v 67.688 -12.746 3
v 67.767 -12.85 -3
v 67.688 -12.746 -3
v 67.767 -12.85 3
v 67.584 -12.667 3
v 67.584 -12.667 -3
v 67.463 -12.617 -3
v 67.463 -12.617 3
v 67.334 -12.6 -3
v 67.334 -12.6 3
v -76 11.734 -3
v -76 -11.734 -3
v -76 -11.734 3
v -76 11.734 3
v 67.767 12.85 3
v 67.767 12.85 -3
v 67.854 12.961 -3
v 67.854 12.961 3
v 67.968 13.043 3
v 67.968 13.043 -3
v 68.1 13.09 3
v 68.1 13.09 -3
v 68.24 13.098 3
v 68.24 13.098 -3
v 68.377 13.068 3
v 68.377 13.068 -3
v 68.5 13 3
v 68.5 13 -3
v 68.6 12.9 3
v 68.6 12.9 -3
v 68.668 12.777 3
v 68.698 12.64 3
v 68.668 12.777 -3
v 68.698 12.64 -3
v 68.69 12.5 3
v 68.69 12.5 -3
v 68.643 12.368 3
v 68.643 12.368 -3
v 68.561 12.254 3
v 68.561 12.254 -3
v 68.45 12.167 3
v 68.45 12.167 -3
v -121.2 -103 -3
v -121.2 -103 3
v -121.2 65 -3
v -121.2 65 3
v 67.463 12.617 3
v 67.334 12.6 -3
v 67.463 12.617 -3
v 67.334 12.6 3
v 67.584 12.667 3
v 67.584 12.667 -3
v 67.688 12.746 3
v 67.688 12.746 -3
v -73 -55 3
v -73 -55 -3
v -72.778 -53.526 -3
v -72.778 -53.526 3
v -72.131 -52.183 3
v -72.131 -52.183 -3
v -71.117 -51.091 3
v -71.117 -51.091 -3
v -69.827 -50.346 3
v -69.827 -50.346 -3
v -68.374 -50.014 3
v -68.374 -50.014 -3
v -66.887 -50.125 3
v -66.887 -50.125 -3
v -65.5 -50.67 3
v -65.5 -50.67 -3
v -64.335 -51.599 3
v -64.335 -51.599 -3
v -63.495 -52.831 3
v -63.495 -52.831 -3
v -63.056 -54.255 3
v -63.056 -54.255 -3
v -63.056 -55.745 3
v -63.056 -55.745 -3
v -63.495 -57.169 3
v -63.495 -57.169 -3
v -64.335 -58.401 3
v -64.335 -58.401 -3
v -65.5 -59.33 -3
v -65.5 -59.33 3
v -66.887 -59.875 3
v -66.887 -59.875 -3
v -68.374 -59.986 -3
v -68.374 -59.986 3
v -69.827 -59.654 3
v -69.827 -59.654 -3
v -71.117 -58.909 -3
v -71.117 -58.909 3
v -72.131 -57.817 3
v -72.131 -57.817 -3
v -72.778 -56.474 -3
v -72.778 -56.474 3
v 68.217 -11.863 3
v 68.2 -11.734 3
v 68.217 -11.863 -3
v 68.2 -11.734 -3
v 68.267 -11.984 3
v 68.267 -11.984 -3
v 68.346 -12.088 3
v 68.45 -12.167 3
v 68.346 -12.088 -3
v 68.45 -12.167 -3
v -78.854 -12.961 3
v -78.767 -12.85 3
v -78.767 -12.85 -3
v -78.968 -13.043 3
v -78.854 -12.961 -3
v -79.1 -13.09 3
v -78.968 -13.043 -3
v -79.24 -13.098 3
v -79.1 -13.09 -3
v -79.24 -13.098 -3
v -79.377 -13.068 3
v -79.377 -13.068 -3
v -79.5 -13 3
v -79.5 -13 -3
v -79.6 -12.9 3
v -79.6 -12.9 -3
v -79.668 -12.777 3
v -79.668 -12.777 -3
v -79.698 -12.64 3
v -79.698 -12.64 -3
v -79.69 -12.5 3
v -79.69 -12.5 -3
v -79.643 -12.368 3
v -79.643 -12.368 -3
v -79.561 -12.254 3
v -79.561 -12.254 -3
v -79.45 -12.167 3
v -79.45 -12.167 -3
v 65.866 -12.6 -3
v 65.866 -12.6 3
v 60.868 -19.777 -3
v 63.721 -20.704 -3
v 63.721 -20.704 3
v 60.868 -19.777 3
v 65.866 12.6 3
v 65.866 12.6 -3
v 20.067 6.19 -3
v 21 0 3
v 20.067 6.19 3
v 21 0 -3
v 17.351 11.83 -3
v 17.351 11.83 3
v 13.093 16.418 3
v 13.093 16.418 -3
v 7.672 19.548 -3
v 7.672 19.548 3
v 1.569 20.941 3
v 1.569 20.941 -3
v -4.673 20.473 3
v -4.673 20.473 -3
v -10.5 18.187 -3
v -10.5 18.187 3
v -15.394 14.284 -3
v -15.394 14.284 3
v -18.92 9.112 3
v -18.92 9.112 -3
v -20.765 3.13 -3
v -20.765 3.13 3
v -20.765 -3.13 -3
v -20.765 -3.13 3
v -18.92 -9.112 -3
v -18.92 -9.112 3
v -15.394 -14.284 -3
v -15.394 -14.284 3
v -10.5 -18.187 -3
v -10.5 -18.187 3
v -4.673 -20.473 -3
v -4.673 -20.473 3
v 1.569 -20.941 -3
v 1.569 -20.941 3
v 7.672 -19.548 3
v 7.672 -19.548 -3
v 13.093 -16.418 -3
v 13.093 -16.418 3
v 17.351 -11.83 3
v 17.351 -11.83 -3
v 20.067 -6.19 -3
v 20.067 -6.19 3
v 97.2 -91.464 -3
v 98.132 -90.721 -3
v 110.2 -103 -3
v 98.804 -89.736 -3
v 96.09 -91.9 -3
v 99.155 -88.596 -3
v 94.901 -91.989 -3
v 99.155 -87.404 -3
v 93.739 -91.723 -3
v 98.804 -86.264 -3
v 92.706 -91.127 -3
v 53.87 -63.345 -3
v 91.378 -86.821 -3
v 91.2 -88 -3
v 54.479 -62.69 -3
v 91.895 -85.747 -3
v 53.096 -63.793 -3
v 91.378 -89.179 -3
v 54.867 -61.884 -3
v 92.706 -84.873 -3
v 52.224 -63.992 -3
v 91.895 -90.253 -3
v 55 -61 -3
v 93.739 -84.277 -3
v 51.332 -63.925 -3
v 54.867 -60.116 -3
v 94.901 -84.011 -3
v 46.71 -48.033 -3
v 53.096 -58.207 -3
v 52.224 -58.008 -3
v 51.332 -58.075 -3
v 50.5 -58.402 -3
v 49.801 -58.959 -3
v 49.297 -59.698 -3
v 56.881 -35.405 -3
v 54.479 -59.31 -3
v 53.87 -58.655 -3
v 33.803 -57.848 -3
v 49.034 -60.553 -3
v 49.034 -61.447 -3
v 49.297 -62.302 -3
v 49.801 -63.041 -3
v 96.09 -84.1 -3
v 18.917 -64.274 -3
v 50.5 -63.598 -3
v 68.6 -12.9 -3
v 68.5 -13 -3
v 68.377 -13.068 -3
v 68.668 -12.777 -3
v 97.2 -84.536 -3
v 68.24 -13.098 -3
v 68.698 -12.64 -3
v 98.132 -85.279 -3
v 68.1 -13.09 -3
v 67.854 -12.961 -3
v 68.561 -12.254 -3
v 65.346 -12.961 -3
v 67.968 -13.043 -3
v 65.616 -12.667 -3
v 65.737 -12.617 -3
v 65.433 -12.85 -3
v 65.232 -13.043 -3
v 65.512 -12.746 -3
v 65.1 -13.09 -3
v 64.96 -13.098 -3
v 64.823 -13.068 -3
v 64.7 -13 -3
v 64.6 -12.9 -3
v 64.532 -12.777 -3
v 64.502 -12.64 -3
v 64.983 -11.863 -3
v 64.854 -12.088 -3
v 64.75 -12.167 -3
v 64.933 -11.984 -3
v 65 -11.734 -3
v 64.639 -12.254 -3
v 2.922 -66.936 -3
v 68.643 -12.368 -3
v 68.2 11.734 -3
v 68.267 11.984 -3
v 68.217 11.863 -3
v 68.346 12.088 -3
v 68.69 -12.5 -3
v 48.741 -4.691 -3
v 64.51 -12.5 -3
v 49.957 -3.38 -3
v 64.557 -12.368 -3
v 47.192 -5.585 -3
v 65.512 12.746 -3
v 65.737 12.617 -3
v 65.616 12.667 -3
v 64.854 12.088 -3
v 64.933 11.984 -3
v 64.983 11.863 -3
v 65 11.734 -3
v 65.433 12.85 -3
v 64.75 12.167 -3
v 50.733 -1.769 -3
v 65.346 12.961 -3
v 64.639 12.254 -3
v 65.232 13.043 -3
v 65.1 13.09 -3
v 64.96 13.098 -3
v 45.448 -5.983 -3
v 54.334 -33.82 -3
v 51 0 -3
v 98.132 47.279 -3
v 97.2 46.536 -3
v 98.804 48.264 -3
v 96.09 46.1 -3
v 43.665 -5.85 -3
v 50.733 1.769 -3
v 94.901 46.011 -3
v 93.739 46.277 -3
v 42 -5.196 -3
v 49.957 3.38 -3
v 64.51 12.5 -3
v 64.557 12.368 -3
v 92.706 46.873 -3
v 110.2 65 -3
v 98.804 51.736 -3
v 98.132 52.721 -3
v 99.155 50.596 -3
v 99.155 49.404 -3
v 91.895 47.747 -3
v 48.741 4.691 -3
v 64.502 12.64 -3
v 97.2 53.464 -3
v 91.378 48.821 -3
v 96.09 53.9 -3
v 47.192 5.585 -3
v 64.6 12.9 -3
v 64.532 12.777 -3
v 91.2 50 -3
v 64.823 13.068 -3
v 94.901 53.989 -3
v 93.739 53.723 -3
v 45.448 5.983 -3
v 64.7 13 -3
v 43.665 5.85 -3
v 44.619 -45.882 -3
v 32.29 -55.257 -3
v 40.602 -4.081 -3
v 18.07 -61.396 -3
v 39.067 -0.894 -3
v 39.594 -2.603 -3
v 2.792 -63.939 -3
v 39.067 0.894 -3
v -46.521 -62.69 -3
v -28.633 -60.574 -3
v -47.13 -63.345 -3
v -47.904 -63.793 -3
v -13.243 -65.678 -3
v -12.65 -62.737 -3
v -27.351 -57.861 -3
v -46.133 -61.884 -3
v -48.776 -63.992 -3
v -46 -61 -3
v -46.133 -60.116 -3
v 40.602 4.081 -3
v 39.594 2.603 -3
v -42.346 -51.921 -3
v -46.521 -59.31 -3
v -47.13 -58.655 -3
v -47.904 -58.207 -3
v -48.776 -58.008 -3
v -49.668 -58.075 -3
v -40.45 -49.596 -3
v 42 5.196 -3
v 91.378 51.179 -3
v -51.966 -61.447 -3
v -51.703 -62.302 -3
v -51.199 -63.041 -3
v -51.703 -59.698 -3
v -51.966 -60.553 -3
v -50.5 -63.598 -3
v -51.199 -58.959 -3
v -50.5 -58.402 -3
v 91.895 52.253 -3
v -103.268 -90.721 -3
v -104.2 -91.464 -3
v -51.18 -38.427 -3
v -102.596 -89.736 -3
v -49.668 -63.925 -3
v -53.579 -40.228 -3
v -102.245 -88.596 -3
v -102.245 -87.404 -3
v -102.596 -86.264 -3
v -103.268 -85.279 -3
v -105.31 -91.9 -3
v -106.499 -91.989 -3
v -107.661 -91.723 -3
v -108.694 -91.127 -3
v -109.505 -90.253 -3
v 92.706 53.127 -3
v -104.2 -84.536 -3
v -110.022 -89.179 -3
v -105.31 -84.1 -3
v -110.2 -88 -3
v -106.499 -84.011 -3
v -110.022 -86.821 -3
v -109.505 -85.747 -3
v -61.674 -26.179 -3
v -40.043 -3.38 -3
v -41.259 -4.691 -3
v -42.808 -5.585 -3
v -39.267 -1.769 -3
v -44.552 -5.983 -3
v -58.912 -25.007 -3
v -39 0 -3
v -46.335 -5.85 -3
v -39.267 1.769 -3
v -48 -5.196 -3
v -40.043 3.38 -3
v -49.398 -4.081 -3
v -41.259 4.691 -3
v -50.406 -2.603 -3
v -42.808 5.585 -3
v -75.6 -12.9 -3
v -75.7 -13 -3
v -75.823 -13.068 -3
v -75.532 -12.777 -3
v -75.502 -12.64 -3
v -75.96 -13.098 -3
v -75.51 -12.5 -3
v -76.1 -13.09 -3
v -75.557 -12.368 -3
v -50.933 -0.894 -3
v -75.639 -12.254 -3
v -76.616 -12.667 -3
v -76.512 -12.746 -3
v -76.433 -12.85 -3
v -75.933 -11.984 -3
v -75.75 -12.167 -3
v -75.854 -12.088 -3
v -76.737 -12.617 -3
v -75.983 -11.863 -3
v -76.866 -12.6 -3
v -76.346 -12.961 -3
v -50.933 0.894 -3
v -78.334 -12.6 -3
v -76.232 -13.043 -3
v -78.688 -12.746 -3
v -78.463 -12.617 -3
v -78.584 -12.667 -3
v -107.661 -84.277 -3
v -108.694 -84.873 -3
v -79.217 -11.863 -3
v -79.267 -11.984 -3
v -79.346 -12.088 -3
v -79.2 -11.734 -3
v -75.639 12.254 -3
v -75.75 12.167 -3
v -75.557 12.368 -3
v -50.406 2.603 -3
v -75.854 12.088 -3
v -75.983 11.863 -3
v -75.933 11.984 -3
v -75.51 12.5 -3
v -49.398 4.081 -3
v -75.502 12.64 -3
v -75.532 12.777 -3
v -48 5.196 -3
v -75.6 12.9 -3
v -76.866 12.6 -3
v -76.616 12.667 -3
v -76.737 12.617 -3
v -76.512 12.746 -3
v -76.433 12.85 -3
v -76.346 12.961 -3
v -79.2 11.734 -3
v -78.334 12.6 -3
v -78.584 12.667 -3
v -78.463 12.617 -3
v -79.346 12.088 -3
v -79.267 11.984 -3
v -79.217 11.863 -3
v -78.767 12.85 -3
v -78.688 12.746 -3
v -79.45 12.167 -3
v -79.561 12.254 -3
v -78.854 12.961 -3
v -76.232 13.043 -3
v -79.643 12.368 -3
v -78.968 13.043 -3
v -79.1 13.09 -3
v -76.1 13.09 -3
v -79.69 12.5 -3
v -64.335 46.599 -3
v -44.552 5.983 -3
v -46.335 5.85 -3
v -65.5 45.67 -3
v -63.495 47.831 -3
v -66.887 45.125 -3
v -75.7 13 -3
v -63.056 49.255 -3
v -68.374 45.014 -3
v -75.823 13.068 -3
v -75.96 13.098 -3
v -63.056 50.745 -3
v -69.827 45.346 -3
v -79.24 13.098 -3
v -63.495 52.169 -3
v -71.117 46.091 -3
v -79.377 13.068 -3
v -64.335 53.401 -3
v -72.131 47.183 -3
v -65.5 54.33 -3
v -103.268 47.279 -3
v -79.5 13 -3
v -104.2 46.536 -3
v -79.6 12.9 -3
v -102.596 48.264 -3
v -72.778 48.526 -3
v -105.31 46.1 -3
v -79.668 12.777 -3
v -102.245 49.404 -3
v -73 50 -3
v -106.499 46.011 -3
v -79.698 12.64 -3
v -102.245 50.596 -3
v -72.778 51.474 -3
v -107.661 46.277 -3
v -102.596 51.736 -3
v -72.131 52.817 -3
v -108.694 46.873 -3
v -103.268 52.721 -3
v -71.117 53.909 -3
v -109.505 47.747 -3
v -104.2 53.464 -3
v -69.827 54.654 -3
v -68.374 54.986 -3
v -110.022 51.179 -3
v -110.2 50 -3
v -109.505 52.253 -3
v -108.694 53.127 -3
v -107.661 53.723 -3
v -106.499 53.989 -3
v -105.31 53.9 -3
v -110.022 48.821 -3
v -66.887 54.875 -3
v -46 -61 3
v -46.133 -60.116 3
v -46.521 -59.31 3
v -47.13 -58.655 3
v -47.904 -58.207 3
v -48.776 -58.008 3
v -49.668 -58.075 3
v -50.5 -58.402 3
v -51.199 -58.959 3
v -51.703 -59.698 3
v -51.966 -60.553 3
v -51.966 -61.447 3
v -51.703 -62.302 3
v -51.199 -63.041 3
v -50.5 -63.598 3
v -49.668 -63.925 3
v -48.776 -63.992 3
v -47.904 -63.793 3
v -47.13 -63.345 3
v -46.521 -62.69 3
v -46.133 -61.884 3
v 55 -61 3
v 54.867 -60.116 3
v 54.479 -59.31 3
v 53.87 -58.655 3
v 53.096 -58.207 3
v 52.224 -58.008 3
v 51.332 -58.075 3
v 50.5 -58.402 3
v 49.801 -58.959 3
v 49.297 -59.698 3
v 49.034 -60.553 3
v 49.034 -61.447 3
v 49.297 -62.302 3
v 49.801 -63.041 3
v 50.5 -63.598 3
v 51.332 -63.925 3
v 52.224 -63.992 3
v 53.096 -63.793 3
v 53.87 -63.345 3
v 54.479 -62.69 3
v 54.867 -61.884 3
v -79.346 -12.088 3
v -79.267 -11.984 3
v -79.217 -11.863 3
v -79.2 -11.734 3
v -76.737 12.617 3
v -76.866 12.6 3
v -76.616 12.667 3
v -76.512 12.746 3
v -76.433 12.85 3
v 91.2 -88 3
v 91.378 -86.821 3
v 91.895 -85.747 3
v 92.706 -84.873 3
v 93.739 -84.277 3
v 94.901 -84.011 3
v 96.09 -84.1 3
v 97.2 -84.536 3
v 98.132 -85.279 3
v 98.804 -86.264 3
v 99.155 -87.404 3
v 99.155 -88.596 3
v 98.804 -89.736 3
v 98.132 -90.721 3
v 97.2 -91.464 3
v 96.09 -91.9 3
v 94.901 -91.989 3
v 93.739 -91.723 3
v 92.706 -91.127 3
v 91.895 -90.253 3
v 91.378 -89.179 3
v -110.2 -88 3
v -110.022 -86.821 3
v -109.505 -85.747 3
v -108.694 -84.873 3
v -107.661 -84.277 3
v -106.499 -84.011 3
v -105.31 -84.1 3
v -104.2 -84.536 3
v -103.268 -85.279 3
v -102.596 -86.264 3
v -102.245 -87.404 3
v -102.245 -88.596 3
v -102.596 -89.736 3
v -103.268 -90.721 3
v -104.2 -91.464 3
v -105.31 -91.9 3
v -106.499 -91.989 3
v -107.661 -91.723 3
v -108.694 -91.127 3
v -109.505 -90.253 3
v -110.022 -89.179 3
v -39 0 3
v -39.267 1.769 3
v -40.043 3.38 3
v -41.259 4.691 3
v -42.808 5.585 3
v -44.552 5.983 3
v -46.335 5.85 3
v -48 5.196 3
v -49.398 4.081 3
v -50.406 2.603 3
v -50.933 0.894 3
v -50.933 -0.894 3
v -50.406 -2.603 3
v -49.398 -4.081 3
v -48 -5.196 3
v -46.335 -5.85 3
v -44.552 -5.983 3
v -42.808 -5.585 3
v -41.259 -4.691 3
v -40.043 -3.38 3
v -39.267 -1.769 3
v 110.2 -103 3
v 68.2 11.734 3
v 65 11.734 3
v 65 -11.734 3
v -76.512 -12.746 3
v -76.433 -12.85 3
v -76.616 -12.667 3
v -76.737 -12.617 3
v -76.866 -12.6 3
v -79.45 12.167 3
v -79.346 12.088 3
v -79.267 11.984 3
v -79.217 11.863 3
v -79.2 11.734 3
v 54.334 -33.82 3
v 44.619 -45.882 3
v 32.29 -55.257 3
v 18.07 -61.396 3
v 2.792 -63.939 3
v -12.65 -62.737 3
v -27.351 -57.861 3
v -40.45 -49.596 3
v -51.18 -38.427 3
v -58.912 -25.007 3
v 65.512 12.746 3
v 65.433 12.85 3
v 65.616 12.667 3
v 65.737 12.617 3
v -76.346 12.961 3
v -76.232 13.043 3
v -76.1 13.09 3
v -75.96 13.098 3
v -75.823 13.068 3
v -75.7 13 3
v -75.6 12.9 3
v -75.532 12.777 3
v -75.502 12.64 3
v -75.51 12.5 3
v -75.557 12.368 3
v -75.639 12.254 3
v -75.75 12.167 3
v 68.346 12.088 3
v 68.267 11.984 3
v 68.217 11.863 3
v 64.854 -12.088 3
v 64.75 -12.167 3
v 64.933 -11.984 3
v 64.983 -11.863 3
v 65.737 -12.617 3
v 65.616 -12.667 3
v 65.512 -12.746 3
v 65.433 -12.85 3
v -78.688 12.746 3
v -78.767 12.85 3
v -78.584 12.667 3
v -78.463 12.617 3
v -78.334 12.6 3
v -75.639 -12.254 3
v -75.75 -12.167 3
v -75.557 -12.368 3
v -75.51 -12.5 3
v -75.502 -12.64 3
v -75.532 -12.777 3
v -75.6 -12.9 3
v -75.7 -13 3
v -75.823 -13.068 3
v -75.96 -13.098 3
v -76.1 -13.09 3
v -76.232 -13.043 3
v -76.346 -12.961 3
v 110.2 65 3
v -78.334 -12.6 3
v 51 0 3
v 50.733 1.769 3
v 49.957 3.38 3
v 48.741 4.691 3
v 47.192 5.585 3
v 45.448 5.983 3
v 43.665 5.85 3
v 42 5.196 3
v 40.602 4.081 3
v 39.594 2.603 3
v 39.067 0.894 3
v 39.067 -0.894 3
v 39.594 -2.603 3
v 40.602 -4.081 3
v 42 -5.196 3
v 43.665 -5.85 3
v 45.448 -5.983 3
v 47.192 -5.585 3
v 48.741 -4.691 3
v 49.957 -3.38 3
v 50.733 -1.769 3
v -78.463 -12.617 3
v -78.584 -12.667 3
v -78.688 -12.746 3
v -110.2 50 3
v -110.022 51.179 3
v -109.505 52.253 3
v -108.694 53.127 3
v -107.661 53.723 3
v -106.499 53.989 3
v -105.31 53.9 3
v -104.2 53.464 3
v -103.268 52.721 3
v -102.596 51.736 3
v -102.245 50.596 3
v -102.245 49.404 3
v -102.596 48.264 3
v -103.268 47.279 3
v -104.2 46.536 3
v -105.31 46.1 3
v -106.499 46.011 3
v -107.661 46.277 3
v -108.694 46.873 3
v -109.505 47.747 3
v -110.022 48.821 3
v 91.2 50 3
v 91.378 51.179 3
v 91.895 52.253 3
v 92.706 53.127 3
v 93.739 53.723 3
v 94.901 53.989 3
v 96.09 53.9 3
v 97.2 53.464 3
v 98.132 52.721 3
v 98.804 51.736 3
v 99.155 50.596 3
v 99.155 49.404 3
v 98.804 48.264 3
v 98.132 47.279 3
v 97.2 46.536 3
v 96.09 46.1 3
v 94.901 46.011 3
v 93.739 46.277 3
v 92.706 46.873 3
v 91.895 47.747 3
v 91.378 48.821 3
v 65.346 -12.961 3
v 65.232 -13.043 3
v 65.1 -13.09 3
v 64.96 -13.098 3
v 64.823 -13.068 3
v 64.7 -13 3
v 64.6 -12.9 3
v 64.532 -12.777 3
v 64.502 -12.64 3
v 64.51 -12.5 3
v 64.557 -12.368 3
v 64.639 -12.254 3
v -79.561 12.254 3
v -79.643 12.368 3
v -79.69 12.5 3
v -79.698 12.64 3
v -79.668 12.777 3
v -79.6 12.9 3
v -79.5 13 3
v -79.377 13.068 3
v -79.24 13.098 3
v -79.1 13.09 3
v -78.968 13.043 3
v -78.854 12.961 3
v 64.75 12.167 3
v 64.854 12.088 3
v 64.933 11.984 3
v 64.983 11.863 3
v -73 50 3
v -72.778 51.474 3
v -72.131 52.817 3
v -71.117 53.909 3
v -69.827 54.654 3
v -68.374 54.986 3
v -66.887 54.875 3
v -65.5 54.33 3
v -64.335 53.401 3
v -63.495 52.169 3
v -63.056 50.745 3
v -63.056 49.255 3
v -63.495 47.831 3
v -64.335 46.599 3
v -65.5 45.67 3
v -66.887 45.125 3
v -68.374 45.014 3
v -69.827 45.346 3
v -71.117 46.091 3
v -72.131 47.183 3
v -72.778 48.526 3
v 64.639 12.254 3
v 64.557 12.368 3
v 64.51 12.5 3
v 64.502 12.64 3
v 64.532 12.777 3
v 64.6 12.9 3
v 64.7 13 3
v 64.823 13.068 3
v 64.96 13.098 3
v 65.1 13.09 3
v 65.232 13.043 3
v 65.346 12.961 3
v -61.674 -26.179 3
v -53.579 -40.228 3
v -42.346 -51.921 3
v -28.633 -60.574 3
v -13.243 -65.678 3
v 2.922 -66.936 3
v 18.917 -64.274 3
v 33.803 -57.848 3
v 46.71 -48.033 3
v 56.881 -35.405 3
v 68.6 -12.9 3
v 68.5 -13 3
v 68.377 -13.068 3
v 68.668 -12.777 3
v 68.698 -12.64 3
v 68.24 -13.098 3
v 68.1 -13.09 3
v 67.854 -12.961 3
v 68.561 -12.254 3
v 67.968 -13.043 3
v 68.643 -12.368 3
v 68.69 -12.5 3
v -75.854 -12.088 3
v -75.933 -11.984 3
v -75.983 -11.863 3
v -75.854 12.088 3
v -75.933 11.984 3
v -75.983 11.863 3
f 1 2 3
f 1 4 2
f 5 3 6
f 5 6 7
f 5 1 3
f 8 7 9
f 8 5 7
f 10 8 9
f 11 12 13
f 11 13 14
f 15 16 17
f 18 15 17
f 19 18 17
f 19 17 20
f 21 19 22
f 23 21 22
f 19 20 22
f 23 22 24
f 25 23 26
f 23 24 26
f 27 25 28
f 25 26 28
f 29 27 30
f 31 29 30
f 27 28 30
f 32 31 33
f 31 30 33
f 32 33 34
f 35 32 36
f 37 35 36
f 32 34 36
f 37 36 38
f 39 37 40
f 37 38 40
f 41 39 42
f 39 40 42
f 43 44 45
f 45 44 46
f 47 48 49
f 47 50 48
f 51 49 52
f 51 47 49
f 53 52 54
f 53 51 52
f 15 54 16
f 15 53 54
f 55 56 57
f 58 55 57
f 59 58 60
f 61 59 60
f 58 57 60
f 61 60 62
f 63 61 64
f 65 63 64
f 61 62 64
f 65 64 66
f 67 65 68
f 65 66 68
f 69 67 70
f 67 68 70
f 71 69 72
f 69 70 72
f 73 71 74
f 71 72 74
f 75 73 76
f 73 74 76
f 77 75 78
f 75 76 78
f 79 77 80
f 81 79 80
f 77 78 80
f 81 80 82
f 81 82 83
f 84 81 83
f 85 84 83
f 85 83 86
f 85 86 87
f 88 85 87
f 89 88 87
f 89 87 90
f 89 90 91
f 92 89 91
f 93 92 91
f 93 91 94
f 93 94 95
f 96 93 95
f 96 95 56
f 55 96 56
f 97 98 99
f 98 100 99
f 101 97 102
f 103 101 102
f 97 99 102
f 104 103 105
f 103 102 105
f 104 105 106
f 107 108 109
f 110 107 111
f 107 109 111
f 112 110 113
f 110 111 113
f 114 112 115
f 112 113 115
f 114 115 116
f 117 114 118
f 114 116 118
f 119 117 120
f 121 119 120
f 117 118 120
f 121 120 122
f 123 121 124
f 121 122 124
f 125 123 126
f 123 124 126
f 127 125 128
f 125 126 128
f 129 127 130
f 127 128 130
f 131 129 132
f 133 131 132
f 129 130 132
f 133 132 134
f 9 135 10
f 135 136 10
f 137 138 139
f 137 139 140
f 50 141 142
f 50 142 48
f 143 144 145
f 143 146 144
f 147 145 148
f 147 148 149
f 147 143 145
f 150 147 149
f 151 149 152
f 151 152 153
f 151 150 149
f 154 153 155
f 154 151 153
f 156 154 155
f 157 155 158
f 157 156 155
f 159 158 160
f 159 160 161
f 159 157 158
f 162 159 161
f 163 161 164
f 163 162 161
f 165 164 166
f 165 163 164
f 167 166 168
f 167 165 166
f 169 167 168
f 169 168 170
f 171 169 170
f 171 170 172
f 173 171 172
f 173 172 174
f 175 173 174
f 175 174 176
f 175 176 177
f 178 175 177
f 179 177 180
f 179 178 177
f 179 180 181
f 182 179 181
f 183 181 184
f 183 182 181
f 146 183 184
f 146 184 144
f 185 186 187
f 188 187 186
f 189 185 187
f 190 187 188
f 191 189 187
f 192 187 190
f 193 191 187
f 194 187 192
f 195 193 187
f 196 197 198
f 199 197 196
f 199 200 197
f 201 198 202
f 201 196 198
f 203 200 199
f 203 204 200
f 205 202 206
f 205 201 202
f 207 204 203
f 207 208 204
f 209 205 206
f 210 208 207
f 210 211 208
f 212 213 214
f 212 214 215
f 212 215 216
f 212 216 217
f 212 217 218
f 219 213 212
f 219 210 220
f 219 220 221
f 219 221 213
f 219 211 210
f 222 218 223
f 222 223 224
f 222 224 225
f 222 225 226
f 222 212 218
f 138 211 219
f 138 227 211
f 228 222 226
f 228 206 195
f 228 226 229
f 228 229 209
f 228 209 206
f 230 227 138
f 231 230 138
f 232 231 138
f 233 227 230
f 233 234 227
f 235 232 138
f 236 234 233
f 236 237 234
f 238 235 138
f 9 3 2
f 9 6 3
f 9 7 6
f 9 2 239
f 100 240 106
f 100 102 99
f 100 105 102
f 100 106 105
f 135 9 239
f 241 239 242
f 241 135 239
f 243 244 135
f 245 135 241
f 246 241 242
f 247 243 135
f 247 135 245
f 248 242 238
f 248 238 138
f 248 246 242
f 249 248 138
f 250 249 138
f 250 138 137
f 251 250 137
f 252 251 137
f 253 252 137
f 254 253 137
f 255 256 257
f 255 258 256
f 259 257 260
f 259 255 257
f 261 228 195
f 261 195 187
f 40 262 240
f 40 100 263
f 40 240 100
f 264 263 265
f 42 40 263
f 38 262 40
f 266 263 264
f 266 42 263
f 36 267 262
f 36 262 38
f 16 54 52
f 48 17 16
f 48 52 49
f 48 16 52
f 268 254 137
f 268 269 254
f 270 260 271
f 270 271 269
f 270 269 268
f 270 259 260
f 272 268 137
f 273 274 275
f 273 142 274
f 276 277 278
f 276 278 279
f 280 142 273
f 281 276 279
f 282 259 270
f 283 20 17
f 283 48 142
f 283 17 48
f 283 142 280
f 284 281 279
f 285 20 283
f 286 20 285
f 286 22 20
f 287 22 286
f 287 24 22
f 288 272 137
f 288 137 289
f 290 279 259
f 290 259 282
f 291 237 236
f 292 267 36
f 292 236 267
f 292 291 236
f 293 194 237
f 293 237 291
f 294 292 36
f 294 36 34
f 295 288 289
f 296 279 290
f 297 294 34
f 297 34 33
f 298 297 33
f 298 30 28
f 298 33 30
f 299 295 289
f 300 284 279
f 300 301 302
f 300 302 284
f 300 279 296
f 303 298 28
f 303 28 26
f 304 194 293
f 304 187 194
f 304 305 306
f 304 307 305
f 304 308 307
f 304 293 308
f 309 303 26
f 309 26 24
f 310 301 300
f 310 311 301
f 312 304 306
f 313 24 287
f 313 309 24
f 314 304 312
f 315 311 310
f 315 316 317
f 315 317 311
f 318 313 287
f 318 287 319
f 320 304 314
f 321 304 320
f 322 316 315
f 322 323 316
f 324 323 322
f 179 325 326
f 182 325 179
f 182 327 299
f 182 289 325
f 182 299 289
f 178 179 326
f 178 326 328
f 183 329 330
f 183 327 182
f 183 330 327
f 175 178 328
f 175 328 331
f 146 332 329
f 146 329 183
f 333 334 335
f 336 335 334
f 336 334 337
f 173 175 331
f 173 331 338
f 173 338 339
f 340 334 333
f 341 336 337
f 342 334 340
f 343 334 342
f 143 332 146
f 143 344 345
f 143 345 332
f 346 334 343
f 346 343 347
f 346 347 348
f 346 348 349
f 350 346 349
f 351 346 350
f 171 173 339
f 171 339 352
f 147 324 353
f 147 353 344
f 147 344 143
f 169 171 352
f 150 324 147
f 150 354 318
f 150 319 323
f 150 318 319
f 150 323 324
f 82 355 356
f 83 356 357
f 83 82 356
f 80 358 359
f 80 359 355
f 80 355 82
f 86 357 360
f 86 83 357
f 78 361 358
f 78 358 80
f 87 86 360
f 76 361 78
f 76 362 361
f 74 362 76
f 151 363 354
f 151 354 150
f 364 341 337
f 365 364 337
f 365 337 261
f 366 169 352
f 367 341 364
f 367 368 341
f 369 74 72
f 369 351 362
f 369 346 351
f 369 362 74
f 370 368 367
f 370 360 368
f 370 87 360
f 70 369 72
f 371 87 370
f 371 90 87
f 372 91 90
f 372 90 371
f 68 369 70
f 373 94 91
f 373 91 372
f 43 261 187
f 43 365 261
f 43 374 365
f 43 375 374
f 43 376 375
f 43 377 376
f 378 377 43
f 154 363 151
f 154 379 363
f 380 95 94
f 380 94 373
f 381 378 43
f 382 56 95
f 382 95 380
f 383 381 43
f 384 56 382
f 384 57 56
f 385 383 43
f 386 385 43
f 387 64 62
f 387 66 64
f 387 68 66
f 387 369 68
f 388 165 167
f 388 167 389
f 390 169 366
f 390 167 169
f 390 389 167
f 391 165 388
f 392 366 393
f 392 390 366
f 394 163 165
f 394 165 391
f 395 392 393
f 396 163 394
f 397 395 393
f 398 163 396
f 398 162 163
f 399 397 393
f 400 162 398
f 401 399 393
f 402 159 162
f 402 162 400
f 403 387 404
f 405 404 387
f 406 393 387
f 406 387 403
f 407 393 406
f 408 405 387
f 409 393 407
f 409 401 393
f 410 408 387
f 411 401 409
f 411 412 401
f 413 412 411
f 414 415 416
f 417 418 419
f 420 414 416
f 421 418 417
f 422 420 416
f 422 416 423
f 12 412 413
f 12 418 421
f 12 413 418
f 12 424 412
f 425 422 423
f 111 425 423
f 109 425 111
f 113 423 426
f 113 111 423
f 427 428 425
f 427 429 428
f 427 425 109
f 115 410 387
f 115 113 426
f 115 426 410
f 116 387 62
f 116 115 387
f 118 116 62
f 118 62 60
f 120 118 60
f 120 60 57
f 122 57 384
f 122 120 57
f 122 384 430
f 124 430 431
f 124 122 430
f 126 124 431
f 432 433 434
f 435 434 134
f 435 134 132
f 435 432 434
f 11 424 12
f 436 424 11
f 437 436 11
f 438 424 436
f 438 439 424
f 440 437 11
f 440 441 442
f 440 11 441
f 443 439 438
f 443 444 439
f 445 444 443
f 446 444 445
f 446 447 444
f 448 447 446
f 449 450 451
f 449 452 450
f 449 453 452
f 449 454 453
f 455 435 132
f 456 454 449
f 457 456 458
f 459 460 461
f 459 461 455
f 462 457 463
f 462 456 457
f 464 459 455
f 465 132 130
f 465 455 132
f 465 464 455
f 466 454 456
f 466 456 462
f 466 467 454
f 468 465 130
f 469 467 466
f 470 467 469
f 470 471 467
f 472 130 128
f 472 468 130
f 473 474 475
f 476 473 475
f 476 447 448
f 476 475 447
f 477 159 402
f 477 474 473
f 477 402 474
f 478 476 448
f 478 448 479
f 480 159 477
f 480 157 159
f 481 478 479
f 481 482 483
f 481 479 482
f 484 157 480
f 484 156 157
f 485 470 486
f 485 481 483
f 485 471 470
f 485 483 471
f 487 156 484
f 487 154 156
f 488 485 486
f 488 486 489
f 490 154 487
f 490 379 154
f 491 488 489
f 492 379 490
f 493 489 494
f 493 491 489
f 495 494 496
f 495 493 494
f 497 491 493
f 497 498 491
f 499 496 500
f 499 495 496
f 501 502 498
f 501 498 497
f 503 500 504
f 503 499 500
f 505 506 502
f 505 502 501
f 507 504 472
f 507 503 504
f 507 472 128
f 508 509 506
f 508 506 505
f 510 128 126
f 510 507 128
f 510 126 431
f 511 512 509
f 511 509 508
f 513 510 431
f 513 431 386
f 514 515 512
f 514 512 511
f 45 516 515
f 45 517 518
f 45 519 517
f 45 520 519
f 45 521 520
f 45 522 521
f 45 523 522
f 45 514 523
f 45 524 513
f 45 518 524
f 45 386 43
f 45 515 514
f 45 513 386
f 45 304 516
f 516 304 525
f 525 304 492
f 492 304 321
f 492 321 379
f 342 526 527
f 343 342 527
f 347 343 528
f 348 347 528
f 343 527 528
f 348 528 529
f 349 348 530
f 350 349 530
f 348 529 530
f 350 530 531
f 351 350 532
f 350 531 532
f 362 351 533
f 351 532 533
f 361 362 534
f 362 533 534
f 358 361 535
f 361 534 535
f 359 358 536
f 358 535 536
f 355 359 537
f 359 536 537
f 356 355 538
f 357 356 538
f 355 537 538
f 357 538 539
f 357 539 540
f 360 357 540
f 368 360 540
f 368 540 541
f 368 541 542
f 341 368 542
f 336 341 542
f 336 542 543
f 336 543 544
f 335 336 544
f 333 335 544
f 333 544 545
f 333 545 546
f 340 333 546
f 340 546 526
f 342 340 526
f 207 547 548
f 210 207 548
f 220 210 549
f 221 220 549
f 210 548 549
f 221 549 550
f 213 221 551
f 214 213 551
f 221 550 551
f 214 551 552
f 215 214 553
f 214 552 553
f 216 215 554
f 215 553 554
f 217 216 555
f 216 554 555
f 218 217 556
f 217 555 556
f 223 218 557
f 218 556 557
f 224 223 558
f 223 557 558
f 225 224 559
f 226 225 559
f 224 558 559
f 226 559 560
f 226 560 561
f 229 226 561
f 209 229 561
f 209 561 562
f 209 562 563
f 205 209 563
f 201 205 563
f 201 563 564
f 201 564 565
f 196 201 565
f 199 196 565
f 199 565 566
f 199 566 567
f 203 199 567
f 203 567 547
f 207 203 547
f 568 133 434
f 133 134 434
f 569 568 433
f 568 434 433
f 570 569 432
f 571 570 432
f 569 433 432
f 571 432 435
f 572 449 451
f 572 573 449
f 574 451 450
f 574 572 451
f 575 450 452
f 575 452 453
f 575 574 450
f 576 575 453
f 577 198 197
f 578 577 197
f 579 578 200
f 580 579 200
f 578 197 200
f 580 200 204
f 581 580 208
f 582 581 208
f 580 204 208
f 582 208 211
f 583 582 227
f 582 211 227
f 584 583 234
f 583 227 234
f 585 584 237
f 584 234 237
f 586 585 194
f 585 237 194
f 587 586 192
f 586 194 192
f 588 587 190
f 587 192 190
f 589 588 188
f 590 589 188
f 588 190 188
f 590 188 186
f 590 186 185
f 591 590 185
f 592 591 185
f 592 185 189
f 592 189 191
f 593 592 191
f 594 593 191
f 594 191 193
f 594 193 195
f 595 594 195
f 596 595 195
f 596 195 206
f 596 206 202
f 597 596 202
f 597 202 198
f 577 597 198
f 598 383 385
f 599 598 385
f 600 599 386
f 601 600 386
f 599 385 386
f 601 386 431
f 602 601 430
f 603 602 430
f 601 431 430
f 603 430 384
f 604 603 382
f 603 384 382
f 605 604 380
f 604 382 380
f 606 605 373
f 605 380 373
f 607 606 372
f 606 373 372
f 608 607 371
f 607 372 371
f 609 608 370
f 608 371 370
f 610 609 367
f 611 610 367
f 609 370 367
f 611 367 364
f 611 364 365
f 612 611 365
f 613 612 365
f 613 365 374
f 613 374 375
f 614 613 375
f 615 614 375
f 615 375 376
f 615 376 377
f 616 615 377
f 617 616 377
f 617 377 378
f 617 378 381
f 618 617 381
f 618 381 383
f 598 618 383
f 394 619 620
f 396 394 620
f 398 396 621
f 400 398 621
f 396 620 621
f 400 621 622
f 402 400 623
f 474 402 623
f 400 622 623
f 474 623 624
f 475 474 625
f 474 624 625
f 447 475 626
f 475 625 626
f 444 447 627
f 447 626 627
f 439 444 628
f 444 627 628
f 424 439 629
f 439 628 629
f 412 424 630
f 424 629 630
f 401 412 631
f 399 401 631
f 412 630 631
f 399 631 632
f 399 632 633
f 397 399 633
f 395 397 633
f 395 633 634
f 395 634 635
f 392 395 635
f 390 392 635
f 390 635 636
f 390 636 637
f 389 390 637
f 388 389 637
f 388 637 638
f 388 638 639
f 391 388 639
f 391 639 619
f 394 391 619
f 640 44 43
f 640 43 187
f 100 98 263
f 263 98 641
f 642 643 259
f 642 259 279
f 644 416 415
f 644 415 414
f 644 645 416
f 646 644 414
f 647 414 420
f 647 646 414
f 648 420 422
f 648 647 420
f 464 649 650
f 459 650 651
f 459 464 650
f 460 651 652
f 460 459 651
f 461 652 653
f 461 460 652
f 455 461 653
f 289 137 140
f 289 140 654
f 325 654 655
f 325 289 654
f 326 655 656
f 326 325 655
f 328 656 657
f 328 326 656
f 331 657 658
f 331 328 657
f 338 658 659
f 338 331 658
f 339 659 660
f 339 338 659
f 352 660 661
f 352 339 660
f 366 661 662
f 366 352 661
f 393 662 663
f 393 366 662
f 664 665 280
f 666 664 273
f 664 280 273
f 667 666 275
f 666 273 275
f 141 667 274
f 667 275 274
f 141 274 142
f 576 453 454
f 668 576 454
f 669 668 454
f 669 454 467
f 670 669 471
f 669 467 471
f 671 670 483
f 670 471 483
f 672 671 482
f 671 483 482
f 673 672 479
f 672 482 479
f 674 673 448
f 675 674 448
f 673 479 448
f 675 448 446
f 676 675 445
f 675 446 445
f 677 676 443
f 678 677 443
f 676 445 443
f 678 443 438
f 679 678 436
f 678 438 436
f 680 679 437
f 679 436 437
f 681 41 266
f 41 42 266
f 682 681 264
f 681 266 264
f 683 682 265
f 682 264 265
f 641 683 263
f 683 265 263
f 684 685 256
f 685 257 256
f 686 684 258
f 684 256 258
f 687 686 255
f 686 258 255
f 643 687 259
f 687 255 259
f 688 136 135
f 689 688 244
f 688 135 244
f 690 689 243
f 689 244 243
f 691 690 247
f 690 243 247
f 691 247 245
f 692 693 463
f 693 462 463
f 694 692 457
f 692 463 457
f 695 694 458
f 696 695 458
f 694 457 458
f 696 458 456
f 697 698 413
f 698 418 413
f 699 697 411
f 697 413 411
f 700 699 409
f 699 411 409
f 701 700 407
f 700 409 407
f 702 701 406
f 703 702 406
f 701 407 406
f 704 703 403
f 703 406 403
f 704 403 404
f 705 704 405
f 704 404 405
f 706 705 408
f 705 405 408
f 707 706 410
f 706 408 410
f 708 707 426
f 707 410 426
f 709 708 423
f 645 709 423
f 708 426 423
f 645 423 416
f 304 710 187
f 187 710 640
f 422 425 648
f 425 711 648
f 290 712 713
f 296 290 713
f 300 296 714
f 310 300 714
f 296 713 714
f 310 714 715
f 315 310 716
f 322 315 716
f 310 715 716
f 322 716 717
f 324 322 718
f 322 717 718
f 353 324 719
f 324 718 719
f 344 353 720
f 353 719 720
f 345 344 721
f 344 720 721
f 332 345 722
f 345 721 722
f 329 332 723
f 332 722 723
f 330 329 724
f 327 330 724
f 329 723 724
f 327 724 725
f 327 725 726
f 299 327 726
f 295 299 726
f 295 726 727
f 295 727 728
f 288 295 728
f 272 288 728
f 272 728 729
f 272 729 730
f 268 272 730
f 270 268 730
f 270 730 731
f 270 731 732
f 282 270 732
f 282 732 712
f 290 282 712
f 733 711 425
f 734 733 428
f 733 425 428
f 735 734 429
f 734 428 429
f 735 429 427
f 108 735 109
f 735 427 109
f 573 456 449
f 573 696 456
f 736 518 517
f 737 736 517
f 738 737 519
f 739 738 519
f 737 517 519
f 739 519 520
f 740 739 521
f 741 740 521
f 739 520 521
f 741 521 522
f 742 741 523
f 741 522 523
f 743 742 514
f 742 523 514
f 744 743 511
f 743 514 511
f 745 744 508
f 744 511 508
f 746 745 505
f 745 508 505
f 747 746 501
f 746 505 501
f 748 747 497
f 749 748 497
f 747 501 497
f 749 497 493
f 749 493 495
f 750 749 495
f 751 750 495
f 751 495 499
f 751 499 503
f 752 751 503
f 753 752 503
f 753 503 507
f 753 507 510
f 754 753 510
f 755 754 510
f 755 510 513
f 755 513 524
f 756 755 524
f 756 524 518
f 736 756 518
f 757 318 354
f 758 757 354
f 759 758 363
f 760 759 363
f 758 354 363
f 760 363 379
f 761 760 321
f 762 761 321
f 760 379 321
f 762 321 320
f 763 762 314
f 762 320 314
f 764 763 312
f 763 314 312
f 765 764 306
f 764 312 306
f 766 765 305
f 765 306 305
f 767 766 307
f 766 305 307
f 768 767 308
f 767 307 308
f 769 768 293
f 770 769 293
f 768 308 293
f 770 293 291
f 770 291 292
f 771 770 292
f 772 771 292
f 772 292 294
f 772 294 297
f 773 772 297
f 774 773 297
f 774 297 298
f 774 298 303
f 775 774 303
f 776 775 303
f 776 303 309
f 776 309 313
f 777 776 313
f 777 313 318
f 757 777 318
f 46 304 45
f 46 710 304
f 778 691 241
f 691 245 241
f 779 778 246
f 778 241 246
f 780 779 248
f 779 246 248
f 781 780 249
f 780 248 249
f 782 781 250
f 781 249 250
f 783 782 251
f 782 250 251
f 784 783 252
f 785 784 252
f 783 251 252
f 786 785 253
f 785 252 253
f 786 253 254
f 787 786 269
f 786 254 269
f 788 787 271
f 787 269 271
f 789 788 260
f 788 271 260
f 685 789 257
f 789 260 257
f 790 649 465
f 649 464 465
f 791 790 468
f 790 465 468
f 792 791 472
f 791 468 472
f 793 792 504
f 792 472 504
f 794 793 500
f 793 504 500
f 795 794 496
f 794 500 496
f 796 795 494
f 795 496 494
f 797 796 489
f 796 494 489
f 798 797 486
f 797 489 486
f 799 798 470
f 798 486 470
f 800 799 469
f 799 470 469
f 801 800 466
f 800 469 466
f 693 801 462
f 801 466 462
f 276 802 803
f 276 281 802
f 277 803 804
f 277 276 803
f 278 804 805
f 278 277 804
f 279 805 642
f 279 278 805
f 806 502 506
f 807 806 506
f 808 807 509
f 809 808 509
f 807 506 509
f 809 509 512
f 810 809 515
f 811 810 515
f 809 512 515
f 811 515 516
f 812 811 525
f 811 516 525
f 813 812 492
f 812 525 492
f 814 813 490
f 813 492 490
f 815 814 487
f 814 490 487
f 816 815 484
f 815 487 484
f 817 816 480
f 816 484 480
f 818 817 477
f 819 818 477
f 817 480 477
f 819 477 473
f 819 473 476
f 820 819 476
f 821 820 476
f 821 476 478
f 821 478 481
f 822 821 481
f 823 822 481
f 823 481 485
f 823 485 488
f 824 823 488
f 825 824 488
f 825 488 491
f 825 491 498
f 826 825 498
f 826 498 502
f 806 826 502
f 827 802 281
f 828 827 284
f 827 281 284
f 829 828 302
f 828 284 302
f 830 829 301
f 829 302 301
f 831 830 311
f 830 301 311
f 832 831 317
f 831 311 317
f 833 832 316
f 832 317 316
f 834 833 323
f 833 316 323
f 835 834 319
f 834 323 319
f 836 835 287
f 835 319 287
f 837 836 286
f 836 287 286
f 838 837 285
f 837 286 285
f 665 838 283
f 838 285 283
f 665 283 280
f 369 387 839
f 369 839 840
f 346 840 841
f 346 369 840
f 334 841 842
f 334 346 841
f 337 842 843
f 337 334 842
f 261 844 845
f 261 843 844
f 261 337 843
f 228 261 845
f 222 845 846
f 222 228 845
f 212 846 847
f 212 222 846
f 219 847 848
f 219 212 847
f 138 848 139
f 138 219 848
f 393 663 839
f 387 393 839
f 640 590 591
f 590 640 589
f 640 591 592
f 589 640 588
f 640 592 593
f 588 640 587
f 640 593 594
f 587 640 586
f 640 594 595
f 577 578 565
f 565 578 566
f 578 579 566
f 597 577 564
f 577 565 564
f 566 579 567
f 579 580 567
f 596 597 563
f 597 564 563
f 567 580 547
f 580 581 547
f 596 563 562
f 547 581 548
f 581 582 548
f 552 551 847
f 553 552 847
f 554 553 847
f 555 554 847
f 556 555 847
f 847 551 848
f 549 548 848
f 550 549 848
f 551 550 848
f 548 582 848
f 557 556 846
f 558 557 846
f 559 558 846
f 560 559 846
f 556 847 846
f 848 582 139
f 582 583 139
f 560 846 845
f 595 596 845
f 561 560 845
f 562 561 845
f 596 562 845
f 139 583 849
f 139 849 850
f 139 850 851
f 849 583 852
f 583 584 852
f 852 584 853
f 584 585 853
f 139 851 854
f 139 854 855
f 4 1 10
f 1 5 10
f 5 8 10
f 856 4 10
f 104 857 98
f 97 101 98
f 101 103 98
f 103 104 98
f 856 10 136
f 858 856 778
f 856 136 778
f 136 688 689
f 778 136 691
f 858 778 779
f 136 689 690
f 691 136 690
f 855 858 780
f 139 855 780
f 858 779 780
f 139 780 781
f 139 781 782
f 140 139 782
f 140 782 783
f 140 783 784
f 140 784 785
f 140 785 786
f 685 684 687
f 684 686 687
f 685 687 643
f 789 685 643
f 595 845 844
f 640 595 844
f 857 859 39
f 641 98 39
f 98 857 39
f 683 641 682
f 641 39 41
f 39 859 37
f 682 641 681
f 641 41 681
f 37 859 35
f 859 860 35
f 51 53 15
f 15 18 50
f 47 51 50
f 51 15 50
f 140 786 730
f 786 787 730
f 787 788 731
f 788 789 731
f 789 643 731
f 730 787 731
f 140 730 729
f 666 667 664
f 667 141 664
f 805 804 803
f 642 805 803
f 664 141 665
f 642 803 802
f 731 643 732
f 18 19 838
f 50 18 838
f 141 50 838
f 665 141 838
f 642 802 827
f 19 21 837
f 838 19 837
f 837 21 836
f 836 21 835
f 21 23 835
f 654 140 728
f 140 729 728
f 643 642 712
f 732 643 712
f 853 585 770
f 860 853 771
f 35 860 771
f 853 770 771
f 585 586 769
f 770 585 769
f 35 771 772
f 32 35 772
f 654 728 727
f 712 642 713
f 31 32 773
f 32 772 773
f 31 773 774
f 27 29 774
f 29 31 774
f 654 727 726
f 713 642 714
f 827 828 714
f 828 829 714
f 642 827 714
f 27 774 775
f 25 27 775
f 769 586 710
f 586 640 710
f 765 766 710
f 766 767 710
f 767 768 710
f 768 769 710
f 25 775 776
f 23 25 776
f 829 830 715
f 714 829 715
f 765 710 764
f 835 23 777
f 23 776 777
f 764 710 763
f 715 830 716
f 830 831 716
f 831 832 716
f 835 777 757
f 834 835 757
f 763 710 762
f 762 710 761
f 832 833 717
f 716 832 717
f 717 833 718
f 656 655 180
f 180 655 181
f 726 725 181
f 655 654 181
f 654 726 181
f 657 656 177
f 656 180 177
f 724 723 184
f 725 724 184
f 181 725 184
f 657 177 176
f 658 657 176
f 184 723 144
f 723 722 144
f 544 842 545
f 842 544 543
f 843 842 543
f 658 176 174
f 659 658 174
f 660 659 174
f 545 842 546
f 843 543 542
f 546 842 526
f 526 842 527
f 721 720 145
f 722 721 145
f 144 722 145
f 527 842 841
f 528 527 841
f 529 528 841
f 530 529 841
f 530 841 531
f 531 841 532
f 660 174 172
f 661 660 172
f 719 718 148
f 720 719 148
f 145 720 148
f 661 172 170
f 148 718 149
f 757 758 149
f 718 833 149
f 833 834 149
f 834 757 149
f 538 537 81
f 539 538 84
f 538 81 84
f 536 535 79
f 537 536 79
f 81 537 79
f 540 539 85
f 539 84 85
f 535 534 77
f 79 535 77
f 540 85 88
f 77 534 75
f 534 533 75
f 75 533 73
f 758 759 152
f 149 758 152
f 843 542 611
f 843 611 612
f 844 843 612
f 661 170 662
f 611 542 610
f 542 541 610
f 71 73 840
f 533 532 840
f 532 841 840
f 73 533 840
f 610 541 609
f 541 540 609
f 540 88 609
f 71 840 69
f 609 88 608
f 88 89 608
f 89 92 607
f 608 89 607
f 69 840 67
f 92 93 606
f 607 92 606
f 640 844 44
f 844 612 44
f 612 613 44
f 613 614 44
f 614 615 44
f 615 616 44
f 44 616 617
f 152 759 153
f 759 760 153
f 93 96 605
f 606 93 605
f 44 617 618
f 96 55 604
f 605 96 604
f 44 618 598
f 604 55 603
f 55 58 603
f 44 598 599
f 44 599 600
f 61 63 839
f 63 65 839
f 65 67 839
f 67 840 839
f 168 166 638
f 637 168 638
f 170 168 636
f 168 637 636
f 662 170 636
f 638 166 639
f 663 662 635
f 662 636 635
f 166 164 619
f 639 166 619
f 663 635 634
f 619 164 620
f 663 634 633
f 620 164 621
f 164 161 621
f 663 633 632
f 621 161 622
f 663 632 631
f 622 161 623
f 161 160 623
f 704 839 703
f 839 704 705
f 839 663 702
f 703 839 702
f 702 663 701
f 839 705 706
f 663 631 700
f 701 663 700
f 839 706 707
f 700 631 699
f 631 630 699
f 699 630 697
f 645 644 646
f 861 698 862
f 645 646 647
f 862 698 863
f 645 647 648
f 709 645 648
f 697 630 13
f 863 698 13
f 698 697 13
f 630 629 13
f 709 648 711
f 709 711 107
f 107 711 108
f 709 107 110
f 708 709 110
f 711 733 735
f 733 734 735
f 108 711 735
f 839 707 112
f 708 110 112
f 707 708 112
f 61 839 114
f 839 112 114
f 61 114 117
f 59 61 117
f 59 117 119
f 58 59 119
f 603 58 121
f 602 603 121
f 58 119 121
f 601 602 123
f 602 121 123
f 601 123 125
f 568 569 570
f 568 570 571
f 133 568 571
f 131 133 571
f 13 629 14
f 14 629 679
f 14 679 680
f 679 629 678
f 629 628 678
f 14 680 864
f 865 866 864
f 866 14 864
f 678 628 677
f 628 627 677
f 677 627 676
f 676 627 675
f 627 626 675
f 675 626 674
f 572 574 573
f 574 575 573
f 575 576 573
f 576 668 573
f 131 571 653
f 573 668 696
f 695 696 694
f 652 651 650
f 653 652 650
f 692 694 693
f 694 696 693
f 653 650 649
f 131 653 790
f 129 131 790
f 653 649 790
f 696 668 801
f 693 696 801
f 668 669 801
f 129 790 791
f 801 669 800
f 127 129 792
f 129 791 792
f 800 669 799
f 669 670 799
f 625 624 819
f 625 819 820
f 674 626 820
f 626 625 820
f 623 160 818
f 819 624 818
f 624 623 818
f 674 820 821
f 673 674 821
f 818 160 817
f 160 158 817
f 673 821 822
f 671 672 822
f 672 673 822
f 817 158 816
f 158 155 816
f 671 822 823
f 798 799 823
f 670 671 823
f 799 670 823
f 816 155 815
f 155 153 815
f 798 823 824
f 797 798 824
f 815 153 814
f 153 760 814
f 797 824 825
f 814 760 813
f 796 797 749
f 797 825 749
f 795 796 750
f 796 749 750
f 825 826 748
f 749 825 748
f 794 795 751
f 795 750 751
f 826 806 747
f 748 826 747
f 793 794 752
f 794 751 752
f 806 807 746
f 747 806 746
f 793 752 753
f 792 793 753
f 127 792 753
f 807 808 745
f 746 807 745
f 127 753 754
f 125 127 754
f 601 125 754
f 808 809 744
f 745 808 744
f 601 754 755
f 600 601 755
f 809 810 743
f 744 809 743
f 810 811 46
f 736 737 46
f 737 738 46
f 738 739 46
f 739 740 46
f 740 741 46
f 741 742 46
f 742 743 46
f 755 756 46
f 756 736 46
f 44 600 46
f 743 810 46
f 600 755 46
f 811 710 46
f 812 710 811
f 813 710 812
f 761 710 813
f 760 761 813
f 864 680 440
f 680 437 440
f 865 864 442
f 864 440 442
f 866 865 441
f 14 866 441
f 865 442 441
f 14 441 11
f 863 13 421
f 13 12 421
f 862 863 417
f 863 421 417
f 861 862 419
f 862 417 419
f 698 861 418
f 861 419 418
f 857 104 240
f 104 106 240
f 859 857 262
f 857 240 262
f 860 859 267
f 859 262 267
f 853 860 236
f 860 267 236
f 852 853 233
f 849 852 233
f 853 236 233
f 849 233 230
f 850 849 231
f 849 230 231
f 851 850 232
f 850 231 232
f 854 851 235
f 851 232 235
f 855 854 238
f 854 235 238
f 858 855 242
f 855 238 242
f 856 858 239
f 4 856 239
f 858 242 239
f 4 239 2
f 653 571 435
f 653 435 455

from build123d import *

# Parameters (mm, degrees)
SKETCH2_R                  = 21
SKETCH2_W                  = 3.2
SKETCH2_H                  = 25.2
BOSS_EXTRUDE1_DEPTH        = 3
F_10_0_10_DIAMETER_HOLE1_D = 10
F_8_0_8_DIAMETER_HOLE1_D   = 8
F_12_0_12_DIAMETER_HOLE1_D = 12
CUT_EXTRUDE1_DEPTH         = 160.1679616
CUT_EXTRUDE1_DEPTH_BACK    = 160.1679616
F_6_0_6_DIAMETER_HOLE2_D   = 6
SKETCH27_R                 = 0.5
CUT_EXTRUDE2_DEPTH         = 160.1679616
FILLET1_R                  = 0.5


with BuildPart() as part:
    # Sketch2 → Boss-Extrude1 (new, symmetric)
    with BuildSketch(Plane.XY):
        Polygon((-68, 65), (95.2, 65), (110.2, 65), (110.2, -103), (0, -103), (-121.2, -103), (-121.2, 65), (-106.2, 65), align=None)
        Circle(SKETCH2_R, mode=Mode.SUBTRACT)
        with Locations((-77.6, 0)):
            Rectangle(SKETCH2_W, SKETCH2_H, mode=Mode.SUBTRACT)
        with Locations((66.6, 0)):
            Rectangle(SKETCH2_W, SKETCH2_H, mode=Mode.SUBTRACT)
    extrude(amount=BOSS_EXTRUDE1_DEPTH, both=True)

    # Ø10.0 (10) Diameter Hole1 (through all)
    with Locations(Plane.XY.offset(3)):
        with Locations((-68, 50), (-68, -55)):
            Hole(F_10_0_10_DIAMETER_HOLE1_D / 2)

    # Ø8.0 (8) Diameter Hole1 (through all)
    with Locations(Plane.XY.offset(3)):
        with Locations((-106.2, 50), (-106.2, -88), (95.2, -88), (95.2, 50)):
            Hole(F_8_0_8_DIAMETER_HOLE1_D / 2)

    # Ø12.0 (12) Diameter Hole1 (through all)
    with Locations(Plane(origin=(0, 0, -3), x_dir=(-1, 0, 0), z_dir=(0, 0, -1))):
        with Locations((-45, 0), (45, 0)):
            Hole(F_12_0_12_DIAMETER_HOLE1_D / 2)

    # Sketch18 → Cut-Extrude1 (cut, two sides: drawn at the far end of the back side and taken through both)
    with BuildSketch(Plane.XY.offset(3).offset(-CUT_EXTRUDE1_DEPTH_BACK)):
        with BuildLine():
            Line((-58.912310621, -25.006792223), (-61.673825181, -26.178985609))
            ThreePointArc((-61.673825181, -26.178985609), (2.922498953, -66.936230846), (63.720786592, -20.704138623))
            Line((63.720786592, -20.704138623), (60.867617043, -19.77708764))
            ThreePointArc((60.867617043, -19.77708764), (2.791640791, -63.939086181), (-58.912310621, -25.006792223))
        make_face()
    extrude(amount=CUT_EXTRUDE1_DEPTH + CUT_EXTRUDE1_DEPTH_BACK, mode=Mode.SUBTRACT)

    # Ø6.0 (6) Diameter Hole2 (through all)
    with Locations(Plane(origin=(0, 0, -3), x_dir=(-1, 0, 0), z_dir=(0, 0, -1))):
        with Locations((49, -61), (-52, -61)):
            Hole(F_6_0_6_DIAMETER_HOLE2_D / 2)

    # Sketch27 → Cut-Extrude2 (cut, through all)
    with BuildSketch(Plane(origin=(0, 0, -3), x_dir=(-1, 0, 0), z_dir=(0, 0, -1))):
        with Locations((-65, 12.6)):
            Circle(SKETCH27_R)
        with Locations((-68.2, 12.6)):
            Circle(SKETCH27_R)
        with Locations((-65, -12.6)):
            Circle(SKETCH27_R)
        with Locations((-68.2, -12.6)):
            Circle(SKETCH27_R)
        with Locations((79.2, 12.6)):
            Circle(SKETCH27_R)
        with Locations((76, 12.6)):
            Circle(SKETCH27_R)
        with Locations((79.2, -12.6)):
            Circle(SKETCH27_R)
        with Locations((76, -12.6)):
            Circle(SKETCH27_R)
    extrude(amount=-CUT_EXTRUDE2_DEPTH, mode=Mode.SUBTRACT)

    # Fillet1
    fillet1_edges = [part.edges().sort_by_distance(p)[0] for p in [
        (68.2, 12.1, 0),
        (68.2, -12.1, 0),
        (65.5, -12.6, 0),
        (65, 12.1, 0),
        (-76, 12.1, 0),
        (-76, -12.1, 0),
        (-78.7, -12.6, 0),
        (-79.2, 12.1, 0),
        (-78.7, 12.6, 0),
        (67.7, -12.6, 0),
        (65, -12.1, 0),
        (67.7, 12.6, 0),
        (-76.5, -12.6, 0),
        (-79.2, -12.1, 0),
        (-76.5, 12.6, 0),
        (65.5, 12.6, 0),
    ]]
    fillet(fillet1_edges, radius=FILLET1_R)


solid = part.part
